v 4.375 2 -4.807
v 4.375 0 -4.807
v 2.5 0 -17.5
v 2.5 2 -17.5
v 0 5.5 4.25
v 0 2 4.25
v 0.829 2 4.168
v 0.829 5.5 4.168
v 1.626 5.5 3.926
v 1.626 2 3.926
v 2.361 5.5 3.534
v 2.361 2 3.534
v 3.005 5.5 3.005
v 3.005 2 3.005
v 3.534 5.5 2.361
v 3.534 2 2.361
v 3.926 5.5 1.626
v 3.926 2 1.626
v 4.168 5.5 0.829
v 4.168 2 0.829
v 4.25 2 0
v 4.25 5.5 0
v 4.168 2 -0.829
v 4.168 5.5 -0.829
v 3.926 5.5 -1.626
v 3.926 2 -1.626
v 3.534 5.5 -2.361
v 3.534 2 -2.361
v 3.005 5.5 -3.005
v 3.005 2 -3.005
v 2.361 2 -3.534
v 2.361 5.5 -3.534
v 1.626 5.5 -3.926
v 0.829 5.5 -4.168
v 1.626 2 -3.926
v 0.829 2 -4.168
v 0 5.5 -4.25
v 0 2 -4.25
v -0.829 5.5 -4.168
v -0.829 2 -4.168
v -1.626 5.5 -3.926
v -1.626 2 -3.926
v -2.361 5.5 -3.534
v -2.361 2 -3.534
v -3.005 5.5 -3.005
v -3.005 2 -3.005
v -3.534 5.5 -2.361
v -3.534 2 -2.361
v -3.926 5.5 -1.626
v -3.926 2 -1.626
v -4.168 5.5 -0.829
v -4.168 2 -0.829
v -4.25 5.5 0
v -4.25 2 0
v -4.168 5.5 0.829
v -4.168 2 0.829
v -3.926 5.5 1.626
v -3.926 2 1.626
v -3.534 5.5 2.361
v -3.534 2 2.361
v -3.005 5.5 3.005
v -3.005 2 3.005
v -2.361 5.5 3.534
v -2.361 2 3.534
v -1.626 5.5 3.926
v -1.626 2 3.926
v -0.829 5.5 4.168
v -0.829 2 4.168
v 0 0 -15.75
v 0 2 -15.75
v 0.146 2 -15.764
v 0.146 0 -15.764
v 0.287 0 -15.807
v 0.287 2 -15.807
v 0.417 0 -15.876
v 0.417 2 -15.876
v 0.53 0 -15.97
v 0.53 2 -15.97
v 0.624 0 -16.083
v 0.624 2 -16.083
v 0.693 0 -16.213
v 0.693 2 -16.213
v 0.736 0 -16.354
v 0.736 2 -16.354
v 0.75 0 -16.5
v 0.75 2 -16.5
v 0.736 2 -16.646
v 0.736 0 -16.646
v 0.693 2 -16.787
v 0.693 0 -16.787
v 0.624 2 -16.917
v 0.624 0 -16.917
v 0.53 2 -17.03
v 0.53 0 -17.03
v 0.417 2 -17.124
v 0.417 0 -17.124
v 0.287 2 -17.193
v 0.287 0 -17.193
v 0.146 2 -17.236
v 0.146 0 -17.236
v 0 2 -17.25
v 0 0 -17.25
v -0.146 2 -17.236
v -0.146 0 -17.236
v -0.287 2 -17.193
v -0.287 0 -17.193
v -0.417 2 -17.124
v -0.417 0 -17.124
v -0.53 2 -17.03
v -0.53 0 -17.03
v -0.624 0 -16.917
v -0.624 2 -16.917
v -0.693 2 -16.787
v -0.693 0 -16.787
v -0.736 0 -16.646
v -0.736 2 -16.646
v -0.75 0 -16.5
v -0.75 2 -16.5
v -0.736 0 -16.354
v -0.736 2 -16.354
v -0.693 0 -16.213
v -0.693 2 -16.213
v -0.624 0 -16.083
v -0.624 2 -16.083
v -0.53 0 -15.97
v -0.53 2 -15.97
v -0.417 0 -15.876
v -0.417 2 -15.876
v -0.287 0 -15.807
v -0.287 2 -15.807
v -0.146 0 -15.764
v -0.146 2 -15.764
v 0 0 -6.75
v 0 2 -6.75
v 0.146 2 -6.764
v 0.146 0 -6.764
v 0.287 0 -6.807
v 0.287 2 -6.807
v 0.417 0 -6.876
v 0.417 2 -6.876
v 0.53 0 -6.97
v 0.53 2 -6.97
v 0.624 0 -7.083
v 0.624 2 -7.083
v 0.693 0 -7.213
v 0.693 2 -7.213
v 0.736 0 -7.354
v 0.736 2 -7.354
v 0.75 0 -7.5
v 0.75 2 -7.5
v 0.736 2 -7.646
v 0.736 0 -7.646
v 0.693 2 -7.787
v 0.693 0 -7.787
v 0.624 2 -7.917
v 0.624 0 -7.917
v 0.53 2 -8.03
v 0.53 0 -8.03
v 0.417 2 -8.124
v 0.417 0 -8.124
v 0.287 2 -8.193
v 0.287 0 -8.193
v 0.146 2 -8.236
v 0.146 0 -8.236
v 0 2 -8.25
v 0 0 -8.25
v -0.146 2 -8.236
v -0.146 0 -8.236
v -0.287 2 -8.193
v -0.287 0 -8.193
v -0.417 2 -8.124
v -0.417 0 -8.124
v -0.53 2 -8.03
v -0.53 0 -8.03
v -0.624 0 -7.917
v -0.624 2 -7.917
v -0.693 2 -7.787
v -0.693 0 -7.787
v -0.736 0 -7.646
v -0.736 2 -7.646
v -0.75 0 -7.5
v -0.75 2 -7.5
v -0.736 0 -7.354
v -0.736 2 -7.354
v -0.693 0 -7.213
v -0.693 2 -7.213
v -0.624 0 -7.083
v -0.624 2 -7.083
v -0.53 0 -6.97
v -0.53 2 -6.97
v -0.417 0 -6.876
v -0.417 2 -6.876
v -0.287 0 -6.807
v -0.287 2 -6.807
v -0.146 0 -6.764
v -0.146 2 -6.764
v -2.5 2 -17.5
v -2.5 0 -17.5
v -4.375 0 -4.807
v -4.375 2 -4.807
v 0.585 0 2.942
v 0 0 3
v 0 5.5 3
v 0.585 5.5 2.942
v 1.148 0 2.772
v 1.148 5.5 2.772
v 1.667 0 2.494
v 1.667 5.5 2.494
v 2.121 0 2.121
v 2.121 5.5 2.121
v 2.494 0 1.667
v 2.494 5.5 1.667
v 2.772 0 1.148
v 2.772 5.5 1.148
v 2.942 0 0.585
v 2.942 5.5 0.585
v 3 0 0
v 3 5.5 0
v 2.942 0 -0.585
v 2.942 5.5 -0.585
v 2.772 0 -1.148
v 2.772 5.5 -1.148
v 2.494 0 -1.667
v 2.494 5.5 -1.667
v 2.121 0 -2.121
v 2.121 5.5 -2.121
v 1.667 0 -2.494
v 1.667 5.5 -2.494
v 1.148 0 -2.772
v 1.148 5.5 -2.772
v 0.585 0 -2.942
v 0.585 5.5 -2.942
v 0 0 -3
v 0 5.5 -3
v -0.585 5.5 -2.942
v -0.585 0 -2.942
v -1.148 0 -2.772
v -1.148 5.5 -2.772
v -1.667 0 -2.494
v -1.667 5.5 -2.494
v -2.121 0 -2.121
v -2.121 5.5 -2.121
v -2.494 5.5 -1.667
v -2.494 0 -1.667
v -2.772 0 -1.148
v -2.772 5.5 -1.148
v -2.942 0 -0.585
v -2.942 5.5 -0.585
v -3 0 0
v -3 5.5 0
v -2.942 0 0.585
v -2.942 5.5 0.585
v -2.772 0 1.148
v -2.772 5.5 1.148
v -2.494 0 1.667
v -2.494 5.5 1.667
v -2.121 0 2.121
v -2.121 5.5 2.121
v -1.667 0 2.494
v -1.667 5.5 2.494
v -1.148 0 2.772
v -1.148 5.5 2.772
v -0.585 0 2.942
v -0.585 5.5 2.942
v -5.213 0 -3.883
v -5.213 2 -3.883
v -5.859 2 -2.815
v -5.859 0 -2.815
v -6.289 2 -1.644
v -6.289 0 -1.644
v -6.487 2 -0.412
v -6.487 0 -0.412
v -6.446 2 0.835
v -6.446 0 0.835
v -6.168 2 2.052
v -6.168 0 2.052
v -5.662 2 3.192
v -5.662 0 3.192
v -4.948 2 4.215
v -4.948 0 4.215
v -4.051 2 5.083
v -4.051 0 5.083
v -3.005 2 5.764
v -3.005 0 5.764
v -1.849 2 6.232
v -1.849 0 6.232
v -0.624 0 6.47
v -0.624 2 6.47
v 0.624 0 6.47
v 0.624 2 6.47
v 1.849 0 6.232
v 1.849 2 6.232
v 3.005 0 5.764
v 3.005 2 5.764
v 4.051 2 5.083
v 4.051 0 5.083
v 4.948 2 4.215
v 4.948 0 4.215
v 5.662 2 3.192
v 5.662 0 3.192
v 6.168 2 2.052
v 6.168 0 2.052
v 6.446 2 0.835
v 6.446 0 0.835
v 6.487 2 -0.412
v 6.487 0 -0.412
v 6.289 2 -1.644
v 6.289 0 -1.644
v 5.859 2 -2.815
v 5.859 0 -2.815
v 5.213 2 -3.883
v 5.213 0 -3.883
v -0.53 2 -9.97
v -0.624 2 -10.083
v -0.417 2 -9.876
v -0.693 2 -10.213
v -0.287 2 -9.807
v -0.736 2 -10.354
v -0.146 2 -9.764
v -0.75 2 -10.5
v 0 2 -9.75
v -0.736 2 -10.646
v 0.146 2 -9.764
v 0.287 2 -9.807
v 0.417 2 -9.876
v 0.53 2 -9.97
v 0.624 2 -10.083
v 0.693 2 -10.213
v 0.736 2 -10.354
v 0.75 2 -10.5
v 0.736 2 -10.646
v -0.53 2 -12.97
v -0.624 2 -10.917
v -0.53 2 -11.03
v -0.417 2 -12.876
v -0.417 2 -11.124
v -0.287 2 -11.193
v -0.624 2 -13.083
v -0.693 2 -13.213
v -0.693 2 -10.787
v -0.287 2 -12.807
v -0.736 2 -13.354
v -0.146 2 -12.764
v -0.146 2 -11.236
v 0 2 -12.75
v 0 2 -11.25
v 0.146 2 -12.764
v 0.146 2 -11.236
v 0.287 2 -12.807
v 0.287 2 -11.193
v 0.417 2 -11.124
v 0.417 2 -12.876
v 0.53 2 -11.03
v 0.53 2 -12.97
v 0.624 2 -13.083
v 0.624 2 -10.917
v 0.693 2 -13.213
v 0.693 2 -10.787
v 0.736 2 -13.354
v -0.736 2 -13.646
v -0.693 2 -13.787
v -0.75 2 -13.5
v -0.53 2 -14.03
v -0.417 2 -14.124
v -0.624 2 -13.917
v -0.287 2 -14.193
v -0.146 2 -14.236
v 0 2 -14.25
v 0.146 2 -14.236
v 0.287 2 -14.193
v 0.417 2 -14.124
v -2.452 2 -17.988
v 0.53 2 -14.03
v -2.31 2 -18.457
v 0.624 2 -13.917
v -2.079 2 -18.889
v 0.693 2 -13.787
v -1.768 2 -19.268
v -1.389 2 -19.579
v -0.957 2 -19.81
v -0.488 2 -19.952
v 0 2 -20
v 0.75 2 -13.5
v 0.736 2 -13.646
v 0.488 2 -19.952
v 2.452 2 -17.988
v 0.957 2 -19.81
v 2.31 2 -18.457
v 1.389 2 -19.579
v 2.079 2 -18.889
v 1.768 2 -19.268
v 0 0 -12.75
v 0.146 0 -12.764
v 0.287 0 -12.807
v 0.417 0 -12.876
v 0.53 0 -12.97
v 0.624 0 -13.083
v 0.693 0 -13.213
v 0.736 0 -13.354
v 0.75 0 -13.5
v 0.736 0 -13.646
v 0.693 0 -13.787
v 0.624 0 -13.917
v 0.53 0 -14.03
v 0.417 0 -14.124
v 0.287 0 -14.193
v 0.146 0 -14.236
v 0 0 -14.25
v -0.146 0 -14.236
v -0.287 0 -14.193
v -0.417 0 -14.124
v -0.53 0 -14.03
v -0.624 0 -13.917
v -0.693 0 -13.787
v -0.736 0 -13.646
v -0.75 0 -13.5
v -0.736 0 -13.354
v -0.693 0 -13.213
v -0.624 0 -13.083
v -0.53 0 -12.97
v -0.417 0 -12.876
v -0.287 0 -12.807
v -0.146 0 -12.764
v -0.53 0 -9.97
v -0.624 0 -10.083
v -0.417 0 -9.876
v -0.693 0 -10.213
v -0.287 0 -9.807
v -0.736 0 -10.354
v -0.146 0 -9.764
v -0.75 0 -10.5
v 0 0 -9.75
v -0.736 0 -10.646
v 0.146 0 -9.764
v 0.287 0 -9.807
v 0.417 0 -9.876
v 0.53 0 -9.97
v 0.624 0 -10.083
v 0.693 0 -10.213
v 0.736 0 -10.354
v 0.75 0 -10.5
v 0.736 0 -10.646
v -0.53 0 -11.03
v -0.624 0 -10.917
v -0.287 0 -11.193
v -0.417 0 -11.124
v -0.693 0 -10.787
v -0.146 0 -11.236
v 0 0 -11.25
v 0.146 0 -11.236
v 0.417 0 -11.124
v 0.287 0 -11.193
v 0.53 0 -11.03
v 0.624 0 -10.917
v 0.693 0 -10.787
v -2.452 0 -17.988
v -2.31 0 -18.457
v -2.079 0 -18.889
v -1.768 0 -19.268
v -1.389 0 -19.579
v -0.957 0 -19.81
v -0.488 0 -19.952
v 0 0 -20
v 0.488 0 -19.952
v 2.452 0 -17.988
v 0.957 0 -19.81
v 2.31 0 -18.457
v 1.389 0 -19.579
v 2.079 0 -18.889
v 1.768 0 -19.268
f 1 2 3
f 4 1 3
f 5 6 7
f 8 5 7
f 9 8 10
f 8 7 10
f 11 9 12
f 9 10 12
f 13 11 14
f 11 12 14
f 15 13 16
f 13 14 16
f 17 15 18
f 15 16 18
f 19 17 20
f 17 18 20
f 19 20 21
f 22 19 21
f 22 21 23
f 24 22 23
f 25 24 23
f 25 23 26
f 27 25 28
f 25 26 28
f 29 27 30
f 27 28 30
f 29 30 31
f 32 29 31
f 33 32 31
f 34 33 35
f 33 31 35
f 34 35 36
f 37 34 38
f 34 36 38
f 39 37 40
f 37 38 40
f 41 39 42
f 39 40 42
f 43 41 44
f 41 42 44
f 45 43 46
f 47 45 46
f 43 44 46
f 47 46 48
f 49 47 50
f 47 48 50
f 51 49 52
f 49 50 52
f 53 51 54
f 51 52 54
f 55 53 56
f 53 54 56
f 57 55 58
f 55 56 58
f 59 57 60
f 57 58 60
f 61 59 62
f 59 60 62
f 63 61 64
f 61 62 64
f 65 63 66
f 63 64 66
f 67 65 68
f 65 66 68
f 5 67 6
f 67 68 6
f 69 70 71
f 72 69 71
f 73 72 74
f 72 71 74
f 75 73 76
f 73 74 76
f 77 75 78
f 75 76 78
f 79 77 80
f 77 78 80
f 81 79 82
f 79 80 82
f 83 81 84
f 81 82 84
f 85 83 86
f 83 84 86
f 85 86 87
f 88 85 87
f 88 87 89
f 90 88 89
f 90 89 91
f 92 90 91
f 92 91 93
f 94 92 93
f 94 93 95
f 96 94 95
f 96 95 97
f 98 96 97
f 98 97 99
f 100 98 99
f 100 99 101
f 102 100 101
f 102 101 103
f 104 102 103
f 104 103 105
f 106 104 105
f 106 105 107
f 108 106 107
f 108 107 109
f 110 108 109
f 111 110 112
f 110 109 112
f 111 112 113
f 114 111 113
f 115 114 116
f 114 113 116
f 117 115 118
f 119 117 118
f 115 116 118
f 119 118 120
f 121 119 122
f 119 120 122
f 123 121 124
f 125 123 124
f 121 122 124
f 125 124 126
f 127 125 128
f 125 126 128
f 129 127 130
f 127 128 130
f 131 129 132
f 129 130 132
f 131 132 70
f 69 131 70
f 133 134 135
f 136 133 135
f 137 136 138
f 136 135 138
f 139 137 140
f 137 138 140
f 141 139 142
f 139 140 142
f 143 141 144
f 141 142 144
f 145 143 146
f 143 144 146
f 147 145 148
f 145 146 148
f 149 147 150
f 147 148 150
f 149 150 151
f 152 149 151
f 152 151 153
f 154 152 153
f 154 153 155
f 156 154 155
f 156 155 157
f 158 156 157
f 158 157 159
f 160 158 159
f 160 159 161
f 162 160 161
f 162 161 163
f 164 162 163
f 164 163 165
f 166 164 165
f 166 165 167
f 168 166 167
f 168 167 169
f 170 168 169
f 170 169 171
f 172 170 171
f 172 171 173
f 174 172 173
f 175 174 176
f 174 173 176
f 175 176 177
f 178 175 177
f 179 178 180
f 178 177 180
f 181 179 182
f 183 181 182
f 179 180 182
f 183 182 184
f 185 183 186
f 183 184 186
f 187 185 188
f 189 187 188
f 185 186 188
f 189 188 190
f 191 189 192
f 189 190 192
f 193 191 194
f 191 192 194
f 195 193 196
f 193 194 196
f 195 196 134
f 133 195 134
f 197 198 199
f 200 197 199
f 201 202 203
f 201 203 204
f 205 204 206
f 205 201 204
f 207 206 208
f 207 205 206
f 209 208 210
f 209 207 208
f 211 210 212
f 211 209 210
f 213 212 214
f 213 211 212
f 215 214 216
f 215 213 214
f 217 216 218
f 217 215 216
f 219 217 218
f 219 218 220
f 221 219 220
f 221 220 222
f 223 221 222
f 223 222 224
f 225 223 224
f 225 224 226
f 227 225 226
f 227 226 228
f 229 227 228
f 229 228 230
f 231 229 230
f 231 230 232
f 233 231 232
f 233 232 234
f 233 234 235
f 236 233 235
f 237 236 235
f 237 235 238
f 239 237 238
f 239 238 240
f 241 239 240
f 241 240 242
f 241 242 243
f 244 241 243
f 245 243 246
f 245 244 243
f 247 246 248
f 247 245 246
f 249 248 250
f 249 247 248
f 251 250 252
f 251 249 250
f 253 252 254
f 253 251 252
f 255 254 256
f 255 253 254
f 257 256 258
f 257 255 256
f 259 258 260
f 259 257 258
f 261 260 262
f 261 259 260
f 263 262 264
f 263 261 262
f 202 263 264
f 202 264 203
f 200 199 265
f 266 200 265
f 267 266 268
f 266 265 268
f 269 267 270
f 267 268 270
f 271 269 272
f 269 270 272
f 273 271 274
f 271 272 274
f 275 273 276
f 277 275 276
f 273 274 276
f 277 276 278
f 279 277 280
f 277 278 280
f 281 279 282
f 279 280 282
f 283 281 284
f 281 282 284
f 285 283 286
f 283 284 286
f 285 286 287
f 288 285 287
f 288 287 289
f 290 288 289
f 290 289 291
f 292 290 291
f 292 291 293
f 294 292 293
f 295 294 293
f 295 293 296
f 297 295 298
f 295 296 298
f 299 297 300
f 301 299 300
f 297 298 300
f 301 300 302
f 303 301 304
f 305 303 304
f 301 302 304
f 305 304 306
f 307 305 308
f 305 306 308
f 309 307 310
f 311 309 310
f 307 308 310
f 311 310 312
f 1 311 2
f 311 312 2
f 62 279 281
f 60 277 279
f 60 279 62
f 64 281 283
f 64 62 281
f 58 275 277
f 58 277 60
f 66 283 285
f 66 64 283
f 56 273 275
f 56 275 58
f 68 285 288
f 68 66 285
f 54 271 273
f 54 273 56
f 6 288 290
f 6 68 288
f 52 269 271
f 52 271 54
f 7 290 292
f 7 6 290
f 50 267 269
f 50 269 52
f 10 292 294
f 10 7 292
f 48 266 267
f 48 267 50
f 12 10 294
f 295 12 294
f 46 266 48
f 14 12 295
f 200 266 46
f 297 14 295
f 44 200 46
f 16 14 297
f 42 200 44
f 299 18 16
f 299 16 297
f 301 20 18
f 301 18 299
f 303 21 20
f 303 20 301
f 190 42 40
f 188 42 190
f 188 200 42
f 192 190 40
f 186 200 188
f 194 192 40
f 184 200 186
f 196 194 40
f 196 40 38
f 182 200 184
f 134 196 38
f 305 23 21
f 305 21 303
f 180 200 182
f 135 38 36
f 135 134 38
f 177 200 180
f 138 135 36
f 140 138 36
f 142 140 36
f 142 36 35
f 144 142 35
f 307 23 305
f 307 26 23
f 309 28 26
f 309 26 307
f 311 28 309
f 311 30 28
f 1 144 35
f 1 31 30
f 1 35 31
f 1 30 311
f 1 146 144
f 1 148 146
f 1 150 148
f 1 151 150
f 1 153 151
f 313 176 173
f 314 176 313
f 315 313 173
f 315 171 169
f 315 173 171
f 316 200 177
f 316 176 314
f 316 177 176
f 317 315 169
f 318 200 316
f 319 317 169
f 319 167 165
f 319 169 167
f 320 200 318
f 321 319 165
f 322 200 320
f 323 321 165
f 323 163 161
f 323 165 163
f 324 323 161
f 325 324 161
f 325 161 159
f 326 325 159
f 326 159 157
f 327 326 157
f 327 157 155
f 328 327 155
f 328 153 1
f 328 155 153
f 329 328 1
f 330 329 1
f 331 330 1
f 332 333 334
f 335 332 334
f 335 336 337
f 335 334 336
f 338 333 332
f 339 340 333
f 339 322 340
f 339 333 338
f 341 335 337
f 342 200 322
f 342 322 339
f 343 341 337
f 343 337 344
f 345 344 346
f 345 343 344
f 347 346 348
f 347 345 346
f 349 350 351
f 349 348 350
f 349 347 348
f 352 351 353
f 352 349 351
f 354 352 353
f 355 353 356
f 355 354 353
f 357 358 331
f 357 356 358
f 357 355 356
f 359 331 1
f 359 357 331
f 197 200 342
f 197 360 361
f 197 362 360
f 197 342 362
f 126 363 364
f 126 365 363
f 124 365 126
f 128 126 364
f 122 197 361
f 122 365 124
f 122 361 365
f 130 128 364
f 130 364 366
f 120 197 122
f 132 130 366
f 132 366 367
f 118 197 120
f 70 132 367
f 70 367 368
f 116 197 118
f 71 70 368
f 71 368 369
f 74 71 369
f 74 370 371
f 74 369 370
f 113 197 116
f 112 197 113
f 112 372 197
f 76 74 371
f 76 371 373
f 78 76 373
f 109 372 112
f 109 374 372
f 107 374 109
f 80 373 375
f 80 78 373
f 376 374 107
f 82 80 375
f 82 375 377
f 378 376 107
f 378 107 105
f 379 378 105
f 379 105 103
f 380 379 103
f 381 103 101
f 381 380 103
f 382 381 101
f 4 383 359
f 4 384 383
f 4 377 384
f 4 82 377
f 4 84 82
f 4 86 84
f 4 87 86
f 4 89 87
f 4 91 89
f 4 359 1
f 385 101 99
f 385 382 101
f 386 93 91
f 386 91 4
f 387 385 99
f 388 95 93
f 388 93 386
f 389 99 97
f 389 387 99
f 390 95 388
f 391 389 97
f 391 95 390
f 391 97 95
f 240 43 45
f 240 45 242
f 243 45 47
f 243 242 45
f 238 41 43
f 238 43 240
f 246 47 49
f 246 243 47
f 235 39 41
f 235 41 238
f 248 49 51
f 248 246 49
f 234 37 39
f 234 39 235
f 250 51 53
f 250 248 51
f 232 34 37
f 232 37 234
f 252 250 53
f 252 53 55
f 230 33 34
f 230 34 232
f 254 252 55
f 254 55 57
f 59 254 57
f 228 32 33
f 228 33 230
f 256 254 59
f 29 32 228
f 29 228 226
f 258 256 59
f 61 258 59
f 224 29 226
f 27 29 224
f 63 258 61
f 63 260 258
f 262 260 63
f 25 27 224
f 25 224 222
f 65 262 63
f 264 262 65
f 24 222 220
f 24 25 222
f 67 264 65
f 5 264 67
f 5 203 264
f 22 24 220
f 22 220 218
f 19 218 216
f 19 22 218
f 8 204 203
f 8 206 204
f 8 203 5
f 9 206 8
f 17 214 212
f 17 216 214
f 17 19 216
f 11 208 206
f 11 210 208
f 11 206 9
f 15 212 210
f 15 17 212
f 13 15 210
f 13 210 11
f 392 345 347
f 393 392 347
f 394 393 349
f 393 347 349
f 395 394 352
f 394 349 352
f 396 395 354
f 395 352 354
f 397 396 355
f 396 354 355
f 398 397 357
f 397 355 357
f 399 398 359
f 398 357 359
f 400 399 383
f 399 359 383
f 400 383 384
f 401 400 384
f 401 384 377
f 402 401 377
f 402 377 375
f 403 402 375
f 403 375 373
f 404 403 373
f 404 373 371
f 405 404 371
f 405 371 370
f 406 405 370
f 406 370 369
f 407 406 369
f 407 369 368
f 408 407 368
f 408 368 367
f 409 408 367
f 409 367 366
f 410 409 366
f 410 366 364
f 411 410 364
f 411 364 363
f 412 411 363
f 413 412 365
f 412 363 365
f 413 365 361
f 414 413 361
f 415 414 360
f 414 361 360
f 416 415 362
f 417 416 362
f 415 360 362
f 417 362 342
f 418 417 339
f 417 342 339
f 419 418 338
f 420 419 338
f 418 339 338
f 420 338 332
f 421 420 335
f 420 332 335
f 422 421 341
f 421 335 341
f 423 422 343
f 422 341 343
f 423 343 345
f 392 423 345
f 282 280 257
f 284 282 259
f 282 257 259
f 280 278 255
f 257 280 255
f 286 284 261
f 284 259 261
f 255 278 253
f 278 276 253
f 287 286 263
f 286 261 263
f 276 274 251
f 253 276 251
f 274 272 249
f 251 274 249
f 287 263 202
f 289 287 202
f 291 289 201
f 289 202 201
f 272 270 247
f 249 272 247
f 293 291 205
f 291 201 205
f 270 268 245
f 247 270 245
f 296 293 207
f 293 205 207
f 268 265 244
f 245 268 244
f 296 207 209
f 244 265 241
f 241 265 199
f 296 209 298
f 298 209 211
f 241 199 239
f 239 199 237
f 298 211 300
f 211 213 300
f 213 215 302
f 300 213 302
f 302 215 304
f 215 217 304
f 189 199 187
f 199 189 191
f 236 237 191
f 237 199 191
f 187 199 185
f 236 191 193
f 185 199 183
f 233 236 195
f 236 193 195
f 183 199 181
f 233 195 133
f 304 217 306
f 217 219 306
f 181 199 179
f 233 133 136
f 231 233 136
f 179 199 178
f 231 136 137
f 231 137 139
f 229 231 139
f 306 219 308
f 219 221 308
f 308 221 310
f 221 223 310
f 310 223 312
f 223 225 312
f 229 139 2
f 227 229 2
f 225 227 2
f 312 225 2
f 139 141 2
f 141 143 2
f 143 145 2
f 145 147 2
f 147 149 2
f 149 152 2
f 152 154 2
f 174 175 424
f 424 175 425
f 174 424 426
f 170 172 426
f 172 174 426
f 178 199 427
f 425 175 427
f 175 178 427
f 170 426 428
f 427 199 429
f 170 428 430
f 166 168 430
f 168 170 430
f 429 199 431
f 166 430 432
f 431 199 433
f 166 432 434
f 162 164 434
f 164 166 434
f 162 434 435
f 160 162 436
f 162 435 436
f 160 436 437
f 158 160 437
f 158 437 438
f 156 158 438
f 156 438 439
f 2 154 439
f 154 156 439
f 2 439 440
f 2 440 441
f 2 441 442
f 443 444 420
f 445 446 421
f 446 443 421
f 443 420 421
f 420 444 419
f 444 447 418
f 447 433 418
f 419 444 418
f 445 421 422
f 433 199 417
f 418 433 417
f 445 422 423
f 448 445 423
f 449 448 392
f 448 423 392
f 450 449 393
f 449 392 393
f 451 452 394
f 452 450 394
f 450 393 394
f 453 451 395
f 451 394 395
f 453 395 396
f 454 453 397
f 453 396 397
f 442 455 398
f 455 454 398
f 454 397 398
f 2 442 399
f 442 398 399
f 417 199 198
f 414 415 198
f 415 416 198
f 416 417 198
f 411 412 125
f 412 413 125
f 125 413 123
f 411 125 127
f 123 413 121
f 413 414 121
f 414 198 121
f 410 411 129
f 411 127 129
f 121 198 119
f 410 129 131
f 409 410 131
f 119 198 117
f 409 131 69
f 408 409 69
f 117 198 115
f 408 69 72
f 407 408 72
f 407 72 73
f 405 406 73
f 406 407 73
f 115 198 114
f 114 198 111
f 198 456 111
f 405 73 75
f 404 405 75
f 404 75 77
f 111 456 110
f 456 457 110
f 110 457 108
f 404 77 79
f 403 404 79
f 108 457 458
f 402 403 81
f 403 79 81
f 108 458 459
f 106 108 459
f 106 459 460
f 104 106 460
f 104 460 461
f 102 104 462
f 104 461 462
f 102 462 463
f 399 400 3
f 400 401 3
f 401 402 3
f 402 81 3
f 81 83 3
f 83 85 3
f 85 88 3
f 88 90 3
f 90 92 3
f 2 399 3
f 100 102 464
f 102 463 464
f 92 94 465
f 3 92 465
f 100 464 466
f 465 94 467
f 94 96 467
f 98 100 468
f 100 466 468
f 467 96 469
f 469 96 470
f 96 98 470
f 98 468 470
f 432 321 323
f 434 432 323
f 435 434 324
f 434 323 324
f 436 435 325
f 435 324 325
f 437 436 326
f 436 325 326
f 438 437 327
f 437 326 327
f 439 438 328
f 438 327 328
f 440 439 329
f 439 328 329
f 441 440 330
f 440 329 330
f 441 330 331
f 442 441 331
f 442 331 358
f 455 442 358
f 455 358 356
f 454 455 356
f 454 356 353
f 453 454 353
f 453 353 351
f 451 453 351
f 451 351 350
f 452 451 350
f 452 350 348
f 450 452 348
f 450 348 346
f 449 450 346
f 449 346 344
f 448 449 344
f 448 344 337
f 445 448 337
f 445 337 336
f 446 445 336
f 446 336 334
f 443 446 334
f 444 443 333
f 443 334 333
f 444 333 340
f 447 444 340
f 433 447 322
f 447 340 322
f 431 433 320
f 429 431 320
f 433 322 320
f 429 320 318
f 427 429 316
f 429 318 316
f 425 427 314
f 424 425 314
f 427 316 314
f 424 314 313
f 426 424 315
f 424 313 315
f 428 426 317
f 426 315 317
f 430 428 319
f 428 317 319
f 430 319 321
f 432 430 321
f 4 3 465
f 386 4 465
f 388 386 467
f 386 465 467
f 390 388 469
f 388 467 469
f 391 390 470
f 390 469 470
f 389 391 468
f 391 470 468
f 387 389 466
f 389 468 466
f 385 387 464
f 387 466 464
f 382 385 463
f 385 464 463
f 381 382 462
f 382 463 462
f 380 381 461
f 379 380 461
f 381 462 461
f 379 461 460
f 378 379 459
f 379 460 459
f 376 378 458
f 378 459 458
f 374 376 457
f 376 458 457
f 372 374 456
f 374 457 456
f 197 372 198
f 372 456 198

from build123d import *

# Parameters (mm, degrees)
AUFSATZ_LINEAR_AUSTRAGEN1_DEPTH = 2
SKIZZE2_R                       = 4.25
SKIZZE2_R_2                     = 3
AUFSATZ_LINEAR_AUSTRAGEN2_DEPTH = 3.5
SCHNITT_LINEAR_START            = -3.5
SKIZZE3_R                       = 3
SCHNITT_LINEAR_AUSTRAGEN1_DEPTH = 3.5
SKIZZE4_R                       = 0.75
SCHNITT_LINEAR_AUSTRAGEN2_DEPTH = 3.5


with BuildPart() as part:
    # Skizze1 → Aufsatz-Linear austragen1 (new body)
    with BuildSketch(Plane(origin=(0, 0, 0), x_dir=(1, 0, 0), z_dir=(0, 1, 0))):
        with BuildLine():
            Line((-2.5, 17.5), (-4.374965285, 4.807252725))
            ThreePointArc((-4.374965285, 4.807252725), (0, -6.5), (4.374965285, 4.807252725))
            Line((4.374965285, 4.807252725), (2.5, 17.5))
            ThreePointArc((2.5, 17.5), (0, 20), (-2.5, 17.5))
        make_face()
    extrude(amount=AUFSATZ_LINEAR_AUSTRAGEN1_DEPTH)

    # Skizze2 → Aufsatz-Linear austragen2 (add)
    with BuildSketch(Plane(origin=(0, 2, 0), x_dir=(1, 0, 0), z_dir=(0, 1, 0))):
        with Locations(Location((0, 0, 0), (0, 0, 270))):
            Circle(SKIZZE2_R)
        with Locations(Location((0, 0, 0), (0, 0, 270))):
            Circle(SKIZZE2_R_2, mode=Mode.SUBTRACT)
    extrude(amount=AUFSATZ_LINEAR_AUSTRAGEN2_DEPTH)

    # Skizze3 → Schnitt-Linear austragen1 (cut)
    with BuildSketch(Plane(origin=(0, 2, 0), x_dir=(1, 0, 0), z_dir=(0, 1, 0)).offset(SCHNITT_LINEAR_START)):
        with Locations(Location((0, 0, 0), (0, 0, 270))):
            Circle(SKIZZE3_R)
    extrude(amount=SCHNITT_LINEAR_AUSTRAGEN1_DEPTH, mode=Mode.SUBTRACT)

    # Skizze4 → Schnitt-Linear austragen2 (cut)
    with BuildSketch(Plane(origin=(0, 2, 0), x_dir=(1, 0, 0), z_dir=(0, 1, 0))):
        with Locations(Location((0, 7.5, 0), (0, 0, 270))):
            Circle(SKIZZE4_R)
        with Locations(Location((0, 10.5, 0), (0, 0, 270))):
            Circle(SKIZZE4_R)
        with Locations(Location((0, 13.5, 0), (0, 0, 270))):
            Circle(SKIZZE4_R)
        with Locations(Location((0, 16.5, 0), (0, 0, 270))):
            Circle(SKIZZE4_R)
    extrude(amount=-SCHNITT_LINEAR_AUSTRAGEN2_DEPTH, mode=Mode.SUBTRACT)


solid = part.part
